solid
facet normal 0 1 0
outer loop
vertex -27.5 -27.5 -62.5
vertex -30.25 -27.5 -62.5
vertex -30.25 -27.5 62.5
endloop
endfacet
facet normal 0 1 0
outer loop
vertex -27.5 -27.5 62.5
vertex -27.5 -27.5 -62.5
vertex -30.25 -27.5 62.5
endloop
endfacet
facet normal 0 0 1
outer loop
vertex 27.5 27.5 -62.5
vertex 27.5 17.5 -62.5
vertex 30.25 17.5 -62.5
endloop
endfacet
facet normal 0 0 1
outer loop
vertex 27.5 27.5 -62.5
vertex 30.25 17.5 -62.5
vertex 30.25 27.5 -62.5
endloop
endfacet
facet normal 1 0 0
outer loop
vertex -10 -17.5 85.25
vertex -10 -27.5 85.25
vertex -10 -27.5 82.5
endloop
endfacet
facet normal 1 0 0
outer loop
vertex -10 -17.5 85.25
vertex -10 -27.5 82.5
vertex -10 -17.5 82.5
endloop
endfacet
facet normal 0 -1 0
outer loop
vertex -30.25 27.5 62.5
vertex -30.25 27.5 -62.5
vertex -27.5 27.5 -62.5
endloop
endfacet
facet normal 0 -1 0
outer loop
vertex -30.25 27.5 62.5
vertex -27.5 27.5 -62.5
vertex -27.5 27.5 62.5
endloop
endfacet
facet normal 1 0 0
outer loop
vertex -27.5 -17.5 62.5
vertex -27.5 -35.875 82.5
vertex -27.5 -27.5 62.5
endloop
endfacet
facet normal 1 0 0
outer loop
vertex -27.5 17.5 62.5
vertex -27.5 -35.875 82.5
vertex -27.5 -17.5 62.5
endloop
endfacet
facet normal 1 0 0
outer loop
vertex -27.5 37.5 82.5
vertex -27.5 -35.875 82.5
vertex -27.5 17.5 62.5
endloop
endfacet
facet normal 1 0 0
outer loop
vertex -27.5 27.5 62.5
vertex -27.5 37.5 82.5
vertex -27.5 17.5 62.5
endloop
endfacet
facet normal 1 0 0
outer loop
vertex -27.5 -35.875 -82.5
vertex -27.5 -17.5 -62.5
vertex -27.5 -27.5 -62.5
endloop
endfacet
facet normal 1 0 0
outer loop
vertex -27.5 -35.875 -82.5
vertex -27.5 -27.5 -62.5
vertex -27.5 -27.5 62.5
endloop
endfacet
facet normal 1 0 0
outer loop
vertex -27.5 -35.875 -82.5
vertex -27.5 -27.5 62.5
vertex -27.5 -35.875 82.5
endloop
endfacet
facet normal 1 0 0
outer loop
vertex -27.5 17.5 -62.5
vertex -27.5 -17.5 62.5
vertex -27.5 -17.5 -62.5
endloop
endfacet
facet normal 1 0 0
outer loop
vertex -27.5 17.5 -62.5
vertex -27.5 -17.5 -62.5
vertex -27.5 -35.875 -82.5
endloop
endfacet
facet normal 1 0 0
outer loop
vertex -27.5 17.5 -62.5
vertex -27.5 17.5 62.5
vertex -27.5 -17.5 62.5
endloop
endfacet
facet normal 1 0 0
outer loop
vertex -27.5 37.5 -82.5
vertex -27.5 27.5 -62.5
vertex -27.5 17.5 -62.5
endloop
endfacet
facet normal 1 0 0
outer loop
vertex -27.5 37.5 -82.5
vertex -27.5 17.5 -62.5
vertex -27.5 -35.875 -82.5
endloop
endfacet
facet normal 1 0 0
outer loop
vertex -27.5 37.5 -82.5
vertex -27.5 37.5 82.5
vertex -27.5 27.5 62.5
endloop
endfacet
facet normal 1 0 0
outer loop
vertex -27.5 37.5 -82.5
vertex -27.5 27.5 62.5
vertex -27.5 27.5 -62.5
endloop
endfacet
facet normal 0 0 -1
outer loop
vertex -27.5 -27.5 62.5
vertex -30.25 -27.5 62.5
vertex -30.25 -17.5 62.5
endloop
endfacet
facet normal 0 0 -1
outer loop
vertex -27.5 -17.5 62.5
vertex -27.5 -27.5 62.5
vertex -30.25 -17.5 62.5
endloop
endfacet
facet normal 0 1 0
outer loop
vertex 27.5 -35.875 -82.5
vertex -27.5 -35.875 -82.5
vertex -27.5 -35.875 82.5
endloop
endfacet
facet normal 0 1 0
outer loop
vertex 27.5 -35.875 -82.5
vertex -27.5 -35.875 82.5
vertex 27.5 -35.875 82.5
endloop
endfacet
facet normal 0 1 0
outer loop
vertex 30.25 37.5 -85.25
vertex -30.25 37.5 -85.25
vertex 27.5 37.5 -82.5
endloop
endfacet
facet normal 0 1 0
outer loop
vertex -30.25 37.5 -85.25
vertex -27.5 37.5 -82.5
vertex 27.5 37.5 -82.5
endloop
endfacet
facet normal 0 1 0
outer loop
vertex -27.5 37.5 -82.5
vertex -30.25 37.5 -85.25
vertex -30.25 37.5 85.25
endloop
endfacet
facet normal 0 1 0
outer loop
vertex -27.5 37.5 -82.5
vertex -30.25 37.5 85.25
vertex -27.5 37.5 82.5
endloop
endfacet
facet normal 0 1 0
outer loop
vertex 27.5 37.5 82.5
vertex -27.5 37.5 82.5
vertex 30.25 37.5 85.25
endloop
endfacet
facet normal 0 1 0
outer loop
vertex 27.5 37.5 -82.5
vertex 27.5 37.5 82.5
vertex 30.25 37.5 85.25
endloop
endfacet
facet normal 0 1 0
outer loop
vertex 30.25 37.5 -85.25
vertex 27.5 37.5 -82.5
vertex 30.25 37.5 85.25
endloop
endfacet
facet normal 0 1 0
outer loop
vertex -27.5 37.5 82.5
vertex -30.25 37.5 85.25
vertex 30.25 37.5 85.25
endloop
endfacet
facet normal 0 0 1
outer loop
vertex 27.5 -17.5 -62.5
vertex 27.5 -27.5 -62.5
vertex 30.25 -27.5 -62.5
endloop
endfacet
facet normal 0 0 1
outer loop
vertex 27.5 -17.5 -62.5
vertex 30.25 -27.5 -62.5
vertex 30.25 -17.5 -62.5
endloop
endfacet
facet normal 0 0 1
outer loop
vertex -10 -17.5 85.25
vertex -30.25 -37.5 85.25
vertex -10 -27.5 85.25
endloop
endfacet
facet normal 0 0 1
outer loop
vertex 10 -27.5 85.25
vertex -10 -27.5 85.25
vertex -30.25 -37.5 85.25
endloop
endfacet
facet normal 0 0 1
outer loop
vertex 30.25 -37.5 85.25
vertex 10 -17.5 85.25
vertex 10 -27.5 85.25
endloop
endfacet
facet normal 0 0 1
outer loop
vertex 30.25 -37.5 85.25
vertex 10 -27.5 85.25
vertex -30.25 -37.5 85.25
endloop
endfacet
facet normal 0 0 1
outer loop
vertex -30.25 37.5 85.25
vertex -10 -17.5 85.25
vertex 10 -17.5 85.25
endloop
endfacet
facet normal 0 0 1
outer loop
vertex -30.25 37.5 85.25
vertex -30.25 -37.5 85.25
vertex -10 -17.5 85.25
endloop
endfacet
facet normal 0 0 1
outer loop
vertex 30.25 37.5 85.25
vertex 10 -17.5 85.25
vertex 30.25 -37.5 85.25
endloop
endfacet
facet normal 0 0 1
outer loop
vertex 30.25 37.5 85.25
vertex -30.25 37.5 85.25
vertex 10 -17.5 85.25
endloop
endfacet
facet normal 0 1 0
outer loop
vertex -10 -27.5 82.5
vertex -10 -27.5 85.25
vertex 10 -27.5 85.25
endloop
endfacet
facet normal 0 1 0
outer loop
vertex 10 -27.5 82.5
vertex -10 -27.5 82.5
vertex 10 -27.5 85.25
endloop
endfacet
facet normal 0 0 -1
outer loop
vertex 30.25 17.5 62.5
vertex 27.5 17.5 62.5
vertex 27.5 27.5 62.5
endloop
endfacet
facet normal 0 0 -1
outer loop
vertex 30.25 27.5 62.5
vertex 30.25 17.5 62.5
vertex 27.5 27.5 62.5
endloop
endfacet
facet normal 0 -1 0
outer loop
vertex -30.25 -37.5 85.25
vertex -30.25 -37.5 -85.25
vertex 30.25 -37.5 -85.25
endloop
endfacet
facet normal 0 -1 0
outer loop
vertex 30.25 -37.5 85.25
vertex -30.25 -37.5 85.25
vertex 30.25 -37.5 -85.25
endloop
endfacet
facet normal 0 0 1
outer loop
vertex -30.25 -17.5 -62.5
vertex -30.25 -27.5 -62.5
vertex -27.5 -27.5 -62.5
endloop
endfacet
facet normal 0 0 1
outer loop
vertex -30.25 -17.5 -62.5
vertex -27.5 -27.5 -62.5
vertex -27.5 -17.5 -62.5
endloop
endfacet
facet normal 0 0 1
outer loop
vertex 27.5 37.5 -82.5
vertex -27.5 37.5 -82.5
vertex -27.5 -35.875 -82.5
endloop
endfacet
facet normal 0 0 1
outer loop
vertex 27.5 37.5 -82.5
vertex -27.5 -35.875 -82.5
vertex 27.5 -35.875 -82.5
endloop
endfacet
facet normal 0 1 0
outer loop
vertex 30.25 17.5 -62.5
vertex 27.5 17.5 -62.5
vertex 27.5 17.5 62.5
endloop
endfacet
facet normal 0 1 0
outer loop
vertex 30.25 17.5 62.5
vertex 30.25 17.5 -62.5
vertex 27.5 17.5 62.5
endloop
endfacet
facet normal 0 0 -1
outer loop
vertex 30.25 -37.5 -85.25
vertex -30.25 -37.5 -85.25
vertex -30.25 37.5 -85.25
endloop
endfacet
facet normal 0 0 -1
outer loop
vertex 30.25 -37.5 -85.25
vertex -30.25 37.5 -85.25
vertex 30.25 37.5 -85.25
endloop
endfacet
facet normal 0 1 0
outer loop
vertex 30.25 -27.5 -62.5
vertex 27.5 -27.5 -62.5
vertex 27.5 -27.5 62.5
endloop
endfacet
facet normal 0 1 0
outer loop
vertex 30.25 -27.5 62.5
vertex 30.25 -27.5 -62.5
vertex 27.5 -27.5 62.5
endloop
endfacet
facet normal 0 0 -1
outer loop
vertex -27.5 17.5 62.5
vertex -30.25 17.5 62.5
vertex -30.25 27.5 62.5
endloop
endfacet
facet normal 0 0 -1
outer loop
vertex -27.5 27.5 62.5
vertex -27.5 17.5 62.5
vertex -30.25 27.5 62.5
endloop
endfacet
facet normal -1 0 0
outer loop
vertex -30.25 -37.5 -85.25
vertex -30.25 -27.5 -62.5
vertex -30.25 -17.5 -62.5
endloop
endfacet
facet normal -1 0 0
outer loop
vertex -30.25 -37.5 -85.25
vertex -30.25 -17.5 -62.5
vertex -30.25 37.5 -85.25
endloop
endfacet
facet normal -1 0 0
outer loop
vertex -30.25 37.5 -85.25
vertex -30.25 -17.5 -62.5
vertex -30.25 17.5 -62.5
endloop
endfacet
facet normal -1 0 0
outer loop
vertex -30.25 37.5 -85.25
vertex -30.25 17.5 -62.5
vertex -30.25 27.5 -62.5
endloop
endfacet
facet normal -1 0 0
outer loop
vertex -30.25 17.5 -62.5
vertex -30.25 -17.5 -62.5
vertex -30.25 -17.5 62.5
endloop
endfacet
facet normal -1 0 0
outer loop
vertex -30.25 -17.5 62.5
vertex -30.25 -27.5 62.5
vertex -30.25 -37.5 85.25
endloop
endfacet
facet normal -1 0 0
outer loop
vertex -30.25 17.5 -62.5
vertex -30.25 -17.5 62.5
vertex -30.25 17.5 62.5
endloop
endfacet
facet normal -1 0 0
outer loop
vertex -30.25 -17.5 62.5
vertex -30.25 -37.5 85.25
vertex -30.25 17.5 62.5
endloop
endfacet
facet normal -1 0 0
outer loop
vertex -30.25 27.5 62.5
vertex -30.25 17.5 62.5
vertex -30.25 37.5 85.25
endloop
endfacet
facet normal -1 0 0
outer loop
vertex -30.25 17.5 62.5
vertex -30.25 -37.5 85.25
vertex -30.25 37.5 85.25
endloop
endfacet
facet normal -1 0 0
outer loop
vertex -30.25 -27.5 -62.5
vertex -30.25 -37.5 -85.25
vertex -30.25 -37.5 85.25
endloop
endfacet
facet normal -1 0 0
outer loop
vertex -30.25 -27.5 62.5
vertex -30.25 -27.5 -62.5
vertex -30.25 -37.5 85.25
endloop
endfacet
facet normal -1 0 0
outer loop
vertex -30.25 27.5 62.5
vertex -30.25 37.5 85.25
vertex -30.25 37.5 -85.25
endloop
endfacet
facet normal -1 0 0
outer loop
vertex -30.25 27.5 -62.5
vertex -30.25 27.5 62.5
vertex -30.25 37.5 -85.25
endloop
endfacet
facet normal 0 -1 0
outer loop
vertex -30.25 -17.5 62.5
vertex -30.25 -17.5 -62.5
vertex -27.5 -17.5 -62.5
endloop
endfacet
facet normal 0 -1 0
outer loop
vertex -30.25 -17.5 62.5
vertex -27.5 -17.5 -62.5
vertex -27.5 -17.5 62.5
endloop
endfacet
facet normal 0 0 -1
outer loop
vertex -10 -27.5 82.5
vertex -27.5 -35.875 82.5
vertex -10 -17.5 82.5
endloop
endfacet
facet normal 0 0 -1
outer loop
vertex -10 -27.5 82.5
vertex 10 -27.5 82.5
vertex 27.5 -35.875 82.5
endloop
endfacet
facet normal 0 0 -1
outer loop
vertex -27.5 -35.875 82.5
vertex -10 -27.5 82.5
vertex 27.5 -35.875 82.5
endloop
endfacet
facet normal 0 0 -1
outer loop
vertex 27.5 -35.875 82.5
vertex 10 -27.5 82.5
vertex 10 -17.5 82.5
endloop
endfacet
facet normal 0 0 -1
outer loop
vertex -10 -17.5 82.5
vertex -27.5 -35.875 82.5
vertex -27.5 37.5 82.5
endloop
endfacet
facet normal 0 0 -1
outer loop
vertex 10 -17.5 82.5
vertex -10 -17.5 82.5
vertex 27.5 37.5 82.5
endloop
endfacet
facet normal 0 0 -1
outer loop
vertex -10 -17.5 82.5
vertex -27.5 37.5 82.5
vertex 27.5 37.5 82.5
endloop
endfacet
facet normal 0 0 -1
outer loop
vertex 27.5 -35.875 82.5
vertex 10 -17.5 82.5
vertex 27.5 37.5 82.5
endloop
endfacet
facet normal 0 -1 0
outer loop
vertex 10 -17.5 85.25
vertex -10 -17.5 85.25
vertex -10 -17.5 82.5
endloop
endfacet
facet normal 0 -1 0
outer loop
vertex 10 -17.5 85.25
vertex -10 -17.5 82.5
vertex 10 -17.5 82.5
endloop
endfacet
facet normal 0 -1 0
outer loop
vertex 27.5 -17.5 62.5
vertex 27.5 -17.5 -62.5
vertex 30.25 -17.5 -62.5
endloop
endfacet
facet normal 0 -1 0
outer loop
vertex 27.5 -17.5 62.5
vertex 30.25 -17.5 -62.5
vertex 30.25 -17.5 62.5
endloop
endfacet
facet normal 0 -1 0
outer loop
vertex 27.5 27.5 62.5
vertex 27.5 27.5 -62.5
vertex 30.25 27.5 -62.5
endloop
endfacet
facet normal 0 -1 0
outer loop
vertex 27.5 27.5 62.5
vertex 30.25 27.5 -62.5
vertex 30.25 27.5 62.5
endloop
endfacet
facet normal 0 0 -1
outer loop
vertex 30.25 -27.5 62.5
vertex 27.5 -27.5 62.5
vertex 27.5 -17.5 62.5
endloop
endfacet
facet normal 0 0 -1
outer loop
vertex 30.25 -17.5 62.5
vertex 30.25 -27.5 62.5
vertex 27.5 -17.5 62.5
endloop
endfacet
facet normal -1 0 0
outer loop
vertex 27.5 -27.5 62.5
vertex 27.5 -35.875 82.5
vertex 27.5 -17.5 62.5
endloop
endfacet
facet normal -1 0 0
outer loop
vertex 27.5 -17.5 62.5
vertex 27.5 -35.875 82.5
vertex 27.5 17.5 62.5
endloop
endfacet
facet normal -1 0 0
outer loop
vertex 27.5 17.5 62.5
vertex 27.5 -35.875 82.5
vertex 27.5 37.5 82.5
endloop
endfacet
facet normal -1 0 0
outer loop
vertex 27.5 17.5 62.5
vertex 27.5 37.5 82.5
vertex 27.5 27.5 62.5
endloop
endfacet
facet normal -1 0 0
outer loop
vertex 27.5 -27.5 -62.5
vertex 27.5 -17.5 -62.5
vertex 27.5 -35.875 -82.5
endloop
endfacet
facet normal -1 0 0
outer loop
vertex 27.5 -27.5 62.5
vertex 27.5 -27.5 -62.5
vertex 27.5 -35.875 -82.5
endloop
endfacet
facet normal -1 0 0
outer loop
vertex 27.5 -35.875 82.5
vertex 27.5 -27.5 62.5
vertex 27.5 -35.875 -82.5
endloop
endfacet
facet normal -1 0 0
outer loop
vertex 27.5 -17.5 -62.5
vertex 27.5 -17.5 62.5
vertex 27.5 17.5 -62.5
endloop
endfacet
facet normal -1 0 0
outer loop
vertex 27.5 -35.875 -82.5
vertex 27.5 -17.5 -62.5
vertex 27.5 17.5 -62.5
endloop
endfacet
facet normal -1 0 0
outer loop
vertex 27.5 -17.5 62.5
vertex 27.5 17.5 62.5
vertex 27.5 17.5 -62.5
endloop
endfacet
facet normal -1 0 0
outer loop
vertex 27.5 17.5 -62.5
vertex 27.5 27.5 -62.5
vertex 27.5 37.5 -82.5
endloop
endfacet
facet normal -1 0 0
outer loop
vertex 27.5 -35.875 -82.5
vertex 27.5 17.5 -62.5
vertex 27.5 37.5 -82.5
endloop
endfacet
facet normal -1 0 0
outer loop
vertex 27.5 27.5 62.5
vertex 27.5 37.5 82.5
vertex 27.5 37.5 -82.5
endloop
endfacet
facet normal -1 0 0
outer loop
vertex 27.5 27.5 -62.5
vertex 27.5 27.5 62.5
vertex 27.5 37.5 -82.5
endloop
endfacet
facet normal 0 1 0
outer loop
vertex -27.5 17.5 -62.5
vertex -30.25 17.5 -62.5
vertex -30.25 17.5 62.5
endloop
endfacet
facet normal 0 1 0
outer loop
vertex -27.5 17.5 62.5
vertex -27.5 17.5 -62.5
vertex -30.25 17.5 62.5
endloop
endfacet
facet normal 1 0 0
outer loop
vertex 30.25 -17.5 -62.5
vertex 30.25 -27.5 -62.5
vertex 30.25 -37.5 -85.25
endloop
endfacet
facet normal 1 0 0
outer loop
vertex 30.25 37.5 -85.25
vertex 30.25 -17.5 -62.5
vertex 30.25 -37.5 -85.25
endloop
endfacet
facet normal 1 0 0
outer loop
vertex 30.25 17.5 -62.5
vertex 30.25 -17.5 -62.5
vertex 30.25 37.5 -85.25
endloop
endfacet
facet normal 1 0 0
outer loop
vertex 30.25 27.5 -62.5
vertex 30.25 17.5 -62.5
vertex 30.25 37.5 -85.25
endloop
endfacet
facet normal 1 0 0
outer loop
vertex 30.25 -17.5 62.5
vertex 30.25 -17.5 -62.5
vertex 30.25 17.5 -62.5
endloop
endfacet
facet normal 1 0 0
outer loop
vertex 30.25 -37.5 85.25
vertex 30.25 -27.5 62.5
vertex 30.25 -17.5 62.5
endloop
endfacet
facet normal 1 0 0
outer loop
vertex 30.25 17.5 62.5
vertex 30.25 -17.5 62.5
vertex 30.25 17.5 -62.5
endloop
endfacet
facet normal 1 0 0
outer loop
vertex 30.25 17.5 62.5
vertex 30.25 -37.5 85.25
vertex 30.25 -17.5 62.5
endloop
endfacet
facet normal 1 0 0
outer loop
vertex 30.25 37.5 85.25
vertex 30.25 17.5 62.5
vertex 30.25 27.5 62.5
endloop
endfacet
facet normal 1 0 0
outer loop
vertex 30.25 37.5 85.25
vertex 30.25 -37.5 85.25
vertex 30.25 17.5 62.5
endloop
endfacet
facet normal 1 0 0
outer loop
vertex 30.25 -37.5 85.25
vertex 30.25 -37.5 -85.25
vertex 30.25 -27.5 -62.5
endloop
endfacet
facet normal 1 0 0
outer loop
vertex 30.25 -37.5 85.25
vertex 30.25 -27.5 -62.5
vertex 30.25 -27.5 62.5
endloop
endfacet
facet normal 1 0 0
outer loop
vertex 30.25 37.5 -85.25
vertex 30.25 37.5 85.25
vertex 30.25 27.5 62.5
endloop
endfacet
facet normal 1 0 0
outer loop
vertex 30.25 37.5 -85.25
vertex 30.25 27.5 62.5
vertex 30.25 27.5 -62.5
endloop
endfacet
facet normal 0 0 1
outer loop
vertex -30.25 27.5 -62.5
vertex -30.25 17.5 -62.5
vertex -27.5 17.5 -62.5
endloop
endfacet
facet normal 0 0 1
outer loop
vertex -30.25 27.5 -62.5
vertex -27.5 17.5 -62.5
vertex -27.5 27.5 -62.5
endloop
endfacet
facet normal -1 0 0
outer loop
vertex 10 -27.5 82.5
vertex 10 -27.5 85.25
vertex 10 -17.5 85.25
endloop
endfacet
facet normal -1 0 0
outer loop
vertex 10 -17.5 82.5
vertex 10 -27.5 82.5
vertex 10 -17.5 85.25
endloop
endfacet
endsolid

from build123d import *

# Parameters (mm, degrees)
SKETCH1_W           = 60.5
SKETCH1_H           = 75
BOSS_EXTRUDE1_DEPTH = 85.25
SKETCH2_W           = 55
SKETCH2_H           = 165
CUT_EXTRUDE1_DEPTH  = 73.375
SKETCH3_W           = 20
SKETCH3_H           = 10
CUT_EXTRUDE2_DEPTH  = 2.75
SKETCH7_W           = 125
SKETCH7_H           = 10
CUT_EXTRUDE4_DEPTH  = 112.058824503


with BuildPart() as part:
    # Sketch1 → Boss-Extrude1 (new, symmetric)
    with BuildSketch(Plane.XY):
        Rectangle(SKETCH1_W, SKETCH1_H)
    extrude(amount=BOSS_EXTRUDE1_DEPTH, both=True)

    # Sketch2 → Cut-Extrude1 (cut)
    with BuildSketch(Plane(origin=(0, 37.5, 0), x_dir=(1, 0, 0), z_dir=(0, 1, 0))):
        Rectangle(SKETCH2_W, SKETCH2_H)
    extrude(amount=-CUT_EXTRUDE1_DEPTH, mode=Mode.SUBTRACT)

    # Sketch3 → Cut-Extrude2 (cut)
    with BuildSketch(Plane.XY.offset(85.25)):
        with Locations((0, -22.5)):
            Rectangle(SKETCH3_W, SKETCH3_H)
    extrude(amount=-CUT_EXTRUDE2_DEPTH, mode=Mode.SUBTRACT)

    # Sketch7 → Cut-Extrude4 (cut, through all)
    with BuildSketch(Plane.ZY.offset(30.25)):
        with Locations((0, -22.5)):
            Rectangle(SKETCH7_W, SKETCH7_H)
        with Locations((0, 22.5)):
            Rectangle(SKETCH7_W, SKETCH7_H)
    extrude(amount=-CUT_EXTRUDE4_DEPTH, mode=Mode.SUBTRACT)


solid = part.part
